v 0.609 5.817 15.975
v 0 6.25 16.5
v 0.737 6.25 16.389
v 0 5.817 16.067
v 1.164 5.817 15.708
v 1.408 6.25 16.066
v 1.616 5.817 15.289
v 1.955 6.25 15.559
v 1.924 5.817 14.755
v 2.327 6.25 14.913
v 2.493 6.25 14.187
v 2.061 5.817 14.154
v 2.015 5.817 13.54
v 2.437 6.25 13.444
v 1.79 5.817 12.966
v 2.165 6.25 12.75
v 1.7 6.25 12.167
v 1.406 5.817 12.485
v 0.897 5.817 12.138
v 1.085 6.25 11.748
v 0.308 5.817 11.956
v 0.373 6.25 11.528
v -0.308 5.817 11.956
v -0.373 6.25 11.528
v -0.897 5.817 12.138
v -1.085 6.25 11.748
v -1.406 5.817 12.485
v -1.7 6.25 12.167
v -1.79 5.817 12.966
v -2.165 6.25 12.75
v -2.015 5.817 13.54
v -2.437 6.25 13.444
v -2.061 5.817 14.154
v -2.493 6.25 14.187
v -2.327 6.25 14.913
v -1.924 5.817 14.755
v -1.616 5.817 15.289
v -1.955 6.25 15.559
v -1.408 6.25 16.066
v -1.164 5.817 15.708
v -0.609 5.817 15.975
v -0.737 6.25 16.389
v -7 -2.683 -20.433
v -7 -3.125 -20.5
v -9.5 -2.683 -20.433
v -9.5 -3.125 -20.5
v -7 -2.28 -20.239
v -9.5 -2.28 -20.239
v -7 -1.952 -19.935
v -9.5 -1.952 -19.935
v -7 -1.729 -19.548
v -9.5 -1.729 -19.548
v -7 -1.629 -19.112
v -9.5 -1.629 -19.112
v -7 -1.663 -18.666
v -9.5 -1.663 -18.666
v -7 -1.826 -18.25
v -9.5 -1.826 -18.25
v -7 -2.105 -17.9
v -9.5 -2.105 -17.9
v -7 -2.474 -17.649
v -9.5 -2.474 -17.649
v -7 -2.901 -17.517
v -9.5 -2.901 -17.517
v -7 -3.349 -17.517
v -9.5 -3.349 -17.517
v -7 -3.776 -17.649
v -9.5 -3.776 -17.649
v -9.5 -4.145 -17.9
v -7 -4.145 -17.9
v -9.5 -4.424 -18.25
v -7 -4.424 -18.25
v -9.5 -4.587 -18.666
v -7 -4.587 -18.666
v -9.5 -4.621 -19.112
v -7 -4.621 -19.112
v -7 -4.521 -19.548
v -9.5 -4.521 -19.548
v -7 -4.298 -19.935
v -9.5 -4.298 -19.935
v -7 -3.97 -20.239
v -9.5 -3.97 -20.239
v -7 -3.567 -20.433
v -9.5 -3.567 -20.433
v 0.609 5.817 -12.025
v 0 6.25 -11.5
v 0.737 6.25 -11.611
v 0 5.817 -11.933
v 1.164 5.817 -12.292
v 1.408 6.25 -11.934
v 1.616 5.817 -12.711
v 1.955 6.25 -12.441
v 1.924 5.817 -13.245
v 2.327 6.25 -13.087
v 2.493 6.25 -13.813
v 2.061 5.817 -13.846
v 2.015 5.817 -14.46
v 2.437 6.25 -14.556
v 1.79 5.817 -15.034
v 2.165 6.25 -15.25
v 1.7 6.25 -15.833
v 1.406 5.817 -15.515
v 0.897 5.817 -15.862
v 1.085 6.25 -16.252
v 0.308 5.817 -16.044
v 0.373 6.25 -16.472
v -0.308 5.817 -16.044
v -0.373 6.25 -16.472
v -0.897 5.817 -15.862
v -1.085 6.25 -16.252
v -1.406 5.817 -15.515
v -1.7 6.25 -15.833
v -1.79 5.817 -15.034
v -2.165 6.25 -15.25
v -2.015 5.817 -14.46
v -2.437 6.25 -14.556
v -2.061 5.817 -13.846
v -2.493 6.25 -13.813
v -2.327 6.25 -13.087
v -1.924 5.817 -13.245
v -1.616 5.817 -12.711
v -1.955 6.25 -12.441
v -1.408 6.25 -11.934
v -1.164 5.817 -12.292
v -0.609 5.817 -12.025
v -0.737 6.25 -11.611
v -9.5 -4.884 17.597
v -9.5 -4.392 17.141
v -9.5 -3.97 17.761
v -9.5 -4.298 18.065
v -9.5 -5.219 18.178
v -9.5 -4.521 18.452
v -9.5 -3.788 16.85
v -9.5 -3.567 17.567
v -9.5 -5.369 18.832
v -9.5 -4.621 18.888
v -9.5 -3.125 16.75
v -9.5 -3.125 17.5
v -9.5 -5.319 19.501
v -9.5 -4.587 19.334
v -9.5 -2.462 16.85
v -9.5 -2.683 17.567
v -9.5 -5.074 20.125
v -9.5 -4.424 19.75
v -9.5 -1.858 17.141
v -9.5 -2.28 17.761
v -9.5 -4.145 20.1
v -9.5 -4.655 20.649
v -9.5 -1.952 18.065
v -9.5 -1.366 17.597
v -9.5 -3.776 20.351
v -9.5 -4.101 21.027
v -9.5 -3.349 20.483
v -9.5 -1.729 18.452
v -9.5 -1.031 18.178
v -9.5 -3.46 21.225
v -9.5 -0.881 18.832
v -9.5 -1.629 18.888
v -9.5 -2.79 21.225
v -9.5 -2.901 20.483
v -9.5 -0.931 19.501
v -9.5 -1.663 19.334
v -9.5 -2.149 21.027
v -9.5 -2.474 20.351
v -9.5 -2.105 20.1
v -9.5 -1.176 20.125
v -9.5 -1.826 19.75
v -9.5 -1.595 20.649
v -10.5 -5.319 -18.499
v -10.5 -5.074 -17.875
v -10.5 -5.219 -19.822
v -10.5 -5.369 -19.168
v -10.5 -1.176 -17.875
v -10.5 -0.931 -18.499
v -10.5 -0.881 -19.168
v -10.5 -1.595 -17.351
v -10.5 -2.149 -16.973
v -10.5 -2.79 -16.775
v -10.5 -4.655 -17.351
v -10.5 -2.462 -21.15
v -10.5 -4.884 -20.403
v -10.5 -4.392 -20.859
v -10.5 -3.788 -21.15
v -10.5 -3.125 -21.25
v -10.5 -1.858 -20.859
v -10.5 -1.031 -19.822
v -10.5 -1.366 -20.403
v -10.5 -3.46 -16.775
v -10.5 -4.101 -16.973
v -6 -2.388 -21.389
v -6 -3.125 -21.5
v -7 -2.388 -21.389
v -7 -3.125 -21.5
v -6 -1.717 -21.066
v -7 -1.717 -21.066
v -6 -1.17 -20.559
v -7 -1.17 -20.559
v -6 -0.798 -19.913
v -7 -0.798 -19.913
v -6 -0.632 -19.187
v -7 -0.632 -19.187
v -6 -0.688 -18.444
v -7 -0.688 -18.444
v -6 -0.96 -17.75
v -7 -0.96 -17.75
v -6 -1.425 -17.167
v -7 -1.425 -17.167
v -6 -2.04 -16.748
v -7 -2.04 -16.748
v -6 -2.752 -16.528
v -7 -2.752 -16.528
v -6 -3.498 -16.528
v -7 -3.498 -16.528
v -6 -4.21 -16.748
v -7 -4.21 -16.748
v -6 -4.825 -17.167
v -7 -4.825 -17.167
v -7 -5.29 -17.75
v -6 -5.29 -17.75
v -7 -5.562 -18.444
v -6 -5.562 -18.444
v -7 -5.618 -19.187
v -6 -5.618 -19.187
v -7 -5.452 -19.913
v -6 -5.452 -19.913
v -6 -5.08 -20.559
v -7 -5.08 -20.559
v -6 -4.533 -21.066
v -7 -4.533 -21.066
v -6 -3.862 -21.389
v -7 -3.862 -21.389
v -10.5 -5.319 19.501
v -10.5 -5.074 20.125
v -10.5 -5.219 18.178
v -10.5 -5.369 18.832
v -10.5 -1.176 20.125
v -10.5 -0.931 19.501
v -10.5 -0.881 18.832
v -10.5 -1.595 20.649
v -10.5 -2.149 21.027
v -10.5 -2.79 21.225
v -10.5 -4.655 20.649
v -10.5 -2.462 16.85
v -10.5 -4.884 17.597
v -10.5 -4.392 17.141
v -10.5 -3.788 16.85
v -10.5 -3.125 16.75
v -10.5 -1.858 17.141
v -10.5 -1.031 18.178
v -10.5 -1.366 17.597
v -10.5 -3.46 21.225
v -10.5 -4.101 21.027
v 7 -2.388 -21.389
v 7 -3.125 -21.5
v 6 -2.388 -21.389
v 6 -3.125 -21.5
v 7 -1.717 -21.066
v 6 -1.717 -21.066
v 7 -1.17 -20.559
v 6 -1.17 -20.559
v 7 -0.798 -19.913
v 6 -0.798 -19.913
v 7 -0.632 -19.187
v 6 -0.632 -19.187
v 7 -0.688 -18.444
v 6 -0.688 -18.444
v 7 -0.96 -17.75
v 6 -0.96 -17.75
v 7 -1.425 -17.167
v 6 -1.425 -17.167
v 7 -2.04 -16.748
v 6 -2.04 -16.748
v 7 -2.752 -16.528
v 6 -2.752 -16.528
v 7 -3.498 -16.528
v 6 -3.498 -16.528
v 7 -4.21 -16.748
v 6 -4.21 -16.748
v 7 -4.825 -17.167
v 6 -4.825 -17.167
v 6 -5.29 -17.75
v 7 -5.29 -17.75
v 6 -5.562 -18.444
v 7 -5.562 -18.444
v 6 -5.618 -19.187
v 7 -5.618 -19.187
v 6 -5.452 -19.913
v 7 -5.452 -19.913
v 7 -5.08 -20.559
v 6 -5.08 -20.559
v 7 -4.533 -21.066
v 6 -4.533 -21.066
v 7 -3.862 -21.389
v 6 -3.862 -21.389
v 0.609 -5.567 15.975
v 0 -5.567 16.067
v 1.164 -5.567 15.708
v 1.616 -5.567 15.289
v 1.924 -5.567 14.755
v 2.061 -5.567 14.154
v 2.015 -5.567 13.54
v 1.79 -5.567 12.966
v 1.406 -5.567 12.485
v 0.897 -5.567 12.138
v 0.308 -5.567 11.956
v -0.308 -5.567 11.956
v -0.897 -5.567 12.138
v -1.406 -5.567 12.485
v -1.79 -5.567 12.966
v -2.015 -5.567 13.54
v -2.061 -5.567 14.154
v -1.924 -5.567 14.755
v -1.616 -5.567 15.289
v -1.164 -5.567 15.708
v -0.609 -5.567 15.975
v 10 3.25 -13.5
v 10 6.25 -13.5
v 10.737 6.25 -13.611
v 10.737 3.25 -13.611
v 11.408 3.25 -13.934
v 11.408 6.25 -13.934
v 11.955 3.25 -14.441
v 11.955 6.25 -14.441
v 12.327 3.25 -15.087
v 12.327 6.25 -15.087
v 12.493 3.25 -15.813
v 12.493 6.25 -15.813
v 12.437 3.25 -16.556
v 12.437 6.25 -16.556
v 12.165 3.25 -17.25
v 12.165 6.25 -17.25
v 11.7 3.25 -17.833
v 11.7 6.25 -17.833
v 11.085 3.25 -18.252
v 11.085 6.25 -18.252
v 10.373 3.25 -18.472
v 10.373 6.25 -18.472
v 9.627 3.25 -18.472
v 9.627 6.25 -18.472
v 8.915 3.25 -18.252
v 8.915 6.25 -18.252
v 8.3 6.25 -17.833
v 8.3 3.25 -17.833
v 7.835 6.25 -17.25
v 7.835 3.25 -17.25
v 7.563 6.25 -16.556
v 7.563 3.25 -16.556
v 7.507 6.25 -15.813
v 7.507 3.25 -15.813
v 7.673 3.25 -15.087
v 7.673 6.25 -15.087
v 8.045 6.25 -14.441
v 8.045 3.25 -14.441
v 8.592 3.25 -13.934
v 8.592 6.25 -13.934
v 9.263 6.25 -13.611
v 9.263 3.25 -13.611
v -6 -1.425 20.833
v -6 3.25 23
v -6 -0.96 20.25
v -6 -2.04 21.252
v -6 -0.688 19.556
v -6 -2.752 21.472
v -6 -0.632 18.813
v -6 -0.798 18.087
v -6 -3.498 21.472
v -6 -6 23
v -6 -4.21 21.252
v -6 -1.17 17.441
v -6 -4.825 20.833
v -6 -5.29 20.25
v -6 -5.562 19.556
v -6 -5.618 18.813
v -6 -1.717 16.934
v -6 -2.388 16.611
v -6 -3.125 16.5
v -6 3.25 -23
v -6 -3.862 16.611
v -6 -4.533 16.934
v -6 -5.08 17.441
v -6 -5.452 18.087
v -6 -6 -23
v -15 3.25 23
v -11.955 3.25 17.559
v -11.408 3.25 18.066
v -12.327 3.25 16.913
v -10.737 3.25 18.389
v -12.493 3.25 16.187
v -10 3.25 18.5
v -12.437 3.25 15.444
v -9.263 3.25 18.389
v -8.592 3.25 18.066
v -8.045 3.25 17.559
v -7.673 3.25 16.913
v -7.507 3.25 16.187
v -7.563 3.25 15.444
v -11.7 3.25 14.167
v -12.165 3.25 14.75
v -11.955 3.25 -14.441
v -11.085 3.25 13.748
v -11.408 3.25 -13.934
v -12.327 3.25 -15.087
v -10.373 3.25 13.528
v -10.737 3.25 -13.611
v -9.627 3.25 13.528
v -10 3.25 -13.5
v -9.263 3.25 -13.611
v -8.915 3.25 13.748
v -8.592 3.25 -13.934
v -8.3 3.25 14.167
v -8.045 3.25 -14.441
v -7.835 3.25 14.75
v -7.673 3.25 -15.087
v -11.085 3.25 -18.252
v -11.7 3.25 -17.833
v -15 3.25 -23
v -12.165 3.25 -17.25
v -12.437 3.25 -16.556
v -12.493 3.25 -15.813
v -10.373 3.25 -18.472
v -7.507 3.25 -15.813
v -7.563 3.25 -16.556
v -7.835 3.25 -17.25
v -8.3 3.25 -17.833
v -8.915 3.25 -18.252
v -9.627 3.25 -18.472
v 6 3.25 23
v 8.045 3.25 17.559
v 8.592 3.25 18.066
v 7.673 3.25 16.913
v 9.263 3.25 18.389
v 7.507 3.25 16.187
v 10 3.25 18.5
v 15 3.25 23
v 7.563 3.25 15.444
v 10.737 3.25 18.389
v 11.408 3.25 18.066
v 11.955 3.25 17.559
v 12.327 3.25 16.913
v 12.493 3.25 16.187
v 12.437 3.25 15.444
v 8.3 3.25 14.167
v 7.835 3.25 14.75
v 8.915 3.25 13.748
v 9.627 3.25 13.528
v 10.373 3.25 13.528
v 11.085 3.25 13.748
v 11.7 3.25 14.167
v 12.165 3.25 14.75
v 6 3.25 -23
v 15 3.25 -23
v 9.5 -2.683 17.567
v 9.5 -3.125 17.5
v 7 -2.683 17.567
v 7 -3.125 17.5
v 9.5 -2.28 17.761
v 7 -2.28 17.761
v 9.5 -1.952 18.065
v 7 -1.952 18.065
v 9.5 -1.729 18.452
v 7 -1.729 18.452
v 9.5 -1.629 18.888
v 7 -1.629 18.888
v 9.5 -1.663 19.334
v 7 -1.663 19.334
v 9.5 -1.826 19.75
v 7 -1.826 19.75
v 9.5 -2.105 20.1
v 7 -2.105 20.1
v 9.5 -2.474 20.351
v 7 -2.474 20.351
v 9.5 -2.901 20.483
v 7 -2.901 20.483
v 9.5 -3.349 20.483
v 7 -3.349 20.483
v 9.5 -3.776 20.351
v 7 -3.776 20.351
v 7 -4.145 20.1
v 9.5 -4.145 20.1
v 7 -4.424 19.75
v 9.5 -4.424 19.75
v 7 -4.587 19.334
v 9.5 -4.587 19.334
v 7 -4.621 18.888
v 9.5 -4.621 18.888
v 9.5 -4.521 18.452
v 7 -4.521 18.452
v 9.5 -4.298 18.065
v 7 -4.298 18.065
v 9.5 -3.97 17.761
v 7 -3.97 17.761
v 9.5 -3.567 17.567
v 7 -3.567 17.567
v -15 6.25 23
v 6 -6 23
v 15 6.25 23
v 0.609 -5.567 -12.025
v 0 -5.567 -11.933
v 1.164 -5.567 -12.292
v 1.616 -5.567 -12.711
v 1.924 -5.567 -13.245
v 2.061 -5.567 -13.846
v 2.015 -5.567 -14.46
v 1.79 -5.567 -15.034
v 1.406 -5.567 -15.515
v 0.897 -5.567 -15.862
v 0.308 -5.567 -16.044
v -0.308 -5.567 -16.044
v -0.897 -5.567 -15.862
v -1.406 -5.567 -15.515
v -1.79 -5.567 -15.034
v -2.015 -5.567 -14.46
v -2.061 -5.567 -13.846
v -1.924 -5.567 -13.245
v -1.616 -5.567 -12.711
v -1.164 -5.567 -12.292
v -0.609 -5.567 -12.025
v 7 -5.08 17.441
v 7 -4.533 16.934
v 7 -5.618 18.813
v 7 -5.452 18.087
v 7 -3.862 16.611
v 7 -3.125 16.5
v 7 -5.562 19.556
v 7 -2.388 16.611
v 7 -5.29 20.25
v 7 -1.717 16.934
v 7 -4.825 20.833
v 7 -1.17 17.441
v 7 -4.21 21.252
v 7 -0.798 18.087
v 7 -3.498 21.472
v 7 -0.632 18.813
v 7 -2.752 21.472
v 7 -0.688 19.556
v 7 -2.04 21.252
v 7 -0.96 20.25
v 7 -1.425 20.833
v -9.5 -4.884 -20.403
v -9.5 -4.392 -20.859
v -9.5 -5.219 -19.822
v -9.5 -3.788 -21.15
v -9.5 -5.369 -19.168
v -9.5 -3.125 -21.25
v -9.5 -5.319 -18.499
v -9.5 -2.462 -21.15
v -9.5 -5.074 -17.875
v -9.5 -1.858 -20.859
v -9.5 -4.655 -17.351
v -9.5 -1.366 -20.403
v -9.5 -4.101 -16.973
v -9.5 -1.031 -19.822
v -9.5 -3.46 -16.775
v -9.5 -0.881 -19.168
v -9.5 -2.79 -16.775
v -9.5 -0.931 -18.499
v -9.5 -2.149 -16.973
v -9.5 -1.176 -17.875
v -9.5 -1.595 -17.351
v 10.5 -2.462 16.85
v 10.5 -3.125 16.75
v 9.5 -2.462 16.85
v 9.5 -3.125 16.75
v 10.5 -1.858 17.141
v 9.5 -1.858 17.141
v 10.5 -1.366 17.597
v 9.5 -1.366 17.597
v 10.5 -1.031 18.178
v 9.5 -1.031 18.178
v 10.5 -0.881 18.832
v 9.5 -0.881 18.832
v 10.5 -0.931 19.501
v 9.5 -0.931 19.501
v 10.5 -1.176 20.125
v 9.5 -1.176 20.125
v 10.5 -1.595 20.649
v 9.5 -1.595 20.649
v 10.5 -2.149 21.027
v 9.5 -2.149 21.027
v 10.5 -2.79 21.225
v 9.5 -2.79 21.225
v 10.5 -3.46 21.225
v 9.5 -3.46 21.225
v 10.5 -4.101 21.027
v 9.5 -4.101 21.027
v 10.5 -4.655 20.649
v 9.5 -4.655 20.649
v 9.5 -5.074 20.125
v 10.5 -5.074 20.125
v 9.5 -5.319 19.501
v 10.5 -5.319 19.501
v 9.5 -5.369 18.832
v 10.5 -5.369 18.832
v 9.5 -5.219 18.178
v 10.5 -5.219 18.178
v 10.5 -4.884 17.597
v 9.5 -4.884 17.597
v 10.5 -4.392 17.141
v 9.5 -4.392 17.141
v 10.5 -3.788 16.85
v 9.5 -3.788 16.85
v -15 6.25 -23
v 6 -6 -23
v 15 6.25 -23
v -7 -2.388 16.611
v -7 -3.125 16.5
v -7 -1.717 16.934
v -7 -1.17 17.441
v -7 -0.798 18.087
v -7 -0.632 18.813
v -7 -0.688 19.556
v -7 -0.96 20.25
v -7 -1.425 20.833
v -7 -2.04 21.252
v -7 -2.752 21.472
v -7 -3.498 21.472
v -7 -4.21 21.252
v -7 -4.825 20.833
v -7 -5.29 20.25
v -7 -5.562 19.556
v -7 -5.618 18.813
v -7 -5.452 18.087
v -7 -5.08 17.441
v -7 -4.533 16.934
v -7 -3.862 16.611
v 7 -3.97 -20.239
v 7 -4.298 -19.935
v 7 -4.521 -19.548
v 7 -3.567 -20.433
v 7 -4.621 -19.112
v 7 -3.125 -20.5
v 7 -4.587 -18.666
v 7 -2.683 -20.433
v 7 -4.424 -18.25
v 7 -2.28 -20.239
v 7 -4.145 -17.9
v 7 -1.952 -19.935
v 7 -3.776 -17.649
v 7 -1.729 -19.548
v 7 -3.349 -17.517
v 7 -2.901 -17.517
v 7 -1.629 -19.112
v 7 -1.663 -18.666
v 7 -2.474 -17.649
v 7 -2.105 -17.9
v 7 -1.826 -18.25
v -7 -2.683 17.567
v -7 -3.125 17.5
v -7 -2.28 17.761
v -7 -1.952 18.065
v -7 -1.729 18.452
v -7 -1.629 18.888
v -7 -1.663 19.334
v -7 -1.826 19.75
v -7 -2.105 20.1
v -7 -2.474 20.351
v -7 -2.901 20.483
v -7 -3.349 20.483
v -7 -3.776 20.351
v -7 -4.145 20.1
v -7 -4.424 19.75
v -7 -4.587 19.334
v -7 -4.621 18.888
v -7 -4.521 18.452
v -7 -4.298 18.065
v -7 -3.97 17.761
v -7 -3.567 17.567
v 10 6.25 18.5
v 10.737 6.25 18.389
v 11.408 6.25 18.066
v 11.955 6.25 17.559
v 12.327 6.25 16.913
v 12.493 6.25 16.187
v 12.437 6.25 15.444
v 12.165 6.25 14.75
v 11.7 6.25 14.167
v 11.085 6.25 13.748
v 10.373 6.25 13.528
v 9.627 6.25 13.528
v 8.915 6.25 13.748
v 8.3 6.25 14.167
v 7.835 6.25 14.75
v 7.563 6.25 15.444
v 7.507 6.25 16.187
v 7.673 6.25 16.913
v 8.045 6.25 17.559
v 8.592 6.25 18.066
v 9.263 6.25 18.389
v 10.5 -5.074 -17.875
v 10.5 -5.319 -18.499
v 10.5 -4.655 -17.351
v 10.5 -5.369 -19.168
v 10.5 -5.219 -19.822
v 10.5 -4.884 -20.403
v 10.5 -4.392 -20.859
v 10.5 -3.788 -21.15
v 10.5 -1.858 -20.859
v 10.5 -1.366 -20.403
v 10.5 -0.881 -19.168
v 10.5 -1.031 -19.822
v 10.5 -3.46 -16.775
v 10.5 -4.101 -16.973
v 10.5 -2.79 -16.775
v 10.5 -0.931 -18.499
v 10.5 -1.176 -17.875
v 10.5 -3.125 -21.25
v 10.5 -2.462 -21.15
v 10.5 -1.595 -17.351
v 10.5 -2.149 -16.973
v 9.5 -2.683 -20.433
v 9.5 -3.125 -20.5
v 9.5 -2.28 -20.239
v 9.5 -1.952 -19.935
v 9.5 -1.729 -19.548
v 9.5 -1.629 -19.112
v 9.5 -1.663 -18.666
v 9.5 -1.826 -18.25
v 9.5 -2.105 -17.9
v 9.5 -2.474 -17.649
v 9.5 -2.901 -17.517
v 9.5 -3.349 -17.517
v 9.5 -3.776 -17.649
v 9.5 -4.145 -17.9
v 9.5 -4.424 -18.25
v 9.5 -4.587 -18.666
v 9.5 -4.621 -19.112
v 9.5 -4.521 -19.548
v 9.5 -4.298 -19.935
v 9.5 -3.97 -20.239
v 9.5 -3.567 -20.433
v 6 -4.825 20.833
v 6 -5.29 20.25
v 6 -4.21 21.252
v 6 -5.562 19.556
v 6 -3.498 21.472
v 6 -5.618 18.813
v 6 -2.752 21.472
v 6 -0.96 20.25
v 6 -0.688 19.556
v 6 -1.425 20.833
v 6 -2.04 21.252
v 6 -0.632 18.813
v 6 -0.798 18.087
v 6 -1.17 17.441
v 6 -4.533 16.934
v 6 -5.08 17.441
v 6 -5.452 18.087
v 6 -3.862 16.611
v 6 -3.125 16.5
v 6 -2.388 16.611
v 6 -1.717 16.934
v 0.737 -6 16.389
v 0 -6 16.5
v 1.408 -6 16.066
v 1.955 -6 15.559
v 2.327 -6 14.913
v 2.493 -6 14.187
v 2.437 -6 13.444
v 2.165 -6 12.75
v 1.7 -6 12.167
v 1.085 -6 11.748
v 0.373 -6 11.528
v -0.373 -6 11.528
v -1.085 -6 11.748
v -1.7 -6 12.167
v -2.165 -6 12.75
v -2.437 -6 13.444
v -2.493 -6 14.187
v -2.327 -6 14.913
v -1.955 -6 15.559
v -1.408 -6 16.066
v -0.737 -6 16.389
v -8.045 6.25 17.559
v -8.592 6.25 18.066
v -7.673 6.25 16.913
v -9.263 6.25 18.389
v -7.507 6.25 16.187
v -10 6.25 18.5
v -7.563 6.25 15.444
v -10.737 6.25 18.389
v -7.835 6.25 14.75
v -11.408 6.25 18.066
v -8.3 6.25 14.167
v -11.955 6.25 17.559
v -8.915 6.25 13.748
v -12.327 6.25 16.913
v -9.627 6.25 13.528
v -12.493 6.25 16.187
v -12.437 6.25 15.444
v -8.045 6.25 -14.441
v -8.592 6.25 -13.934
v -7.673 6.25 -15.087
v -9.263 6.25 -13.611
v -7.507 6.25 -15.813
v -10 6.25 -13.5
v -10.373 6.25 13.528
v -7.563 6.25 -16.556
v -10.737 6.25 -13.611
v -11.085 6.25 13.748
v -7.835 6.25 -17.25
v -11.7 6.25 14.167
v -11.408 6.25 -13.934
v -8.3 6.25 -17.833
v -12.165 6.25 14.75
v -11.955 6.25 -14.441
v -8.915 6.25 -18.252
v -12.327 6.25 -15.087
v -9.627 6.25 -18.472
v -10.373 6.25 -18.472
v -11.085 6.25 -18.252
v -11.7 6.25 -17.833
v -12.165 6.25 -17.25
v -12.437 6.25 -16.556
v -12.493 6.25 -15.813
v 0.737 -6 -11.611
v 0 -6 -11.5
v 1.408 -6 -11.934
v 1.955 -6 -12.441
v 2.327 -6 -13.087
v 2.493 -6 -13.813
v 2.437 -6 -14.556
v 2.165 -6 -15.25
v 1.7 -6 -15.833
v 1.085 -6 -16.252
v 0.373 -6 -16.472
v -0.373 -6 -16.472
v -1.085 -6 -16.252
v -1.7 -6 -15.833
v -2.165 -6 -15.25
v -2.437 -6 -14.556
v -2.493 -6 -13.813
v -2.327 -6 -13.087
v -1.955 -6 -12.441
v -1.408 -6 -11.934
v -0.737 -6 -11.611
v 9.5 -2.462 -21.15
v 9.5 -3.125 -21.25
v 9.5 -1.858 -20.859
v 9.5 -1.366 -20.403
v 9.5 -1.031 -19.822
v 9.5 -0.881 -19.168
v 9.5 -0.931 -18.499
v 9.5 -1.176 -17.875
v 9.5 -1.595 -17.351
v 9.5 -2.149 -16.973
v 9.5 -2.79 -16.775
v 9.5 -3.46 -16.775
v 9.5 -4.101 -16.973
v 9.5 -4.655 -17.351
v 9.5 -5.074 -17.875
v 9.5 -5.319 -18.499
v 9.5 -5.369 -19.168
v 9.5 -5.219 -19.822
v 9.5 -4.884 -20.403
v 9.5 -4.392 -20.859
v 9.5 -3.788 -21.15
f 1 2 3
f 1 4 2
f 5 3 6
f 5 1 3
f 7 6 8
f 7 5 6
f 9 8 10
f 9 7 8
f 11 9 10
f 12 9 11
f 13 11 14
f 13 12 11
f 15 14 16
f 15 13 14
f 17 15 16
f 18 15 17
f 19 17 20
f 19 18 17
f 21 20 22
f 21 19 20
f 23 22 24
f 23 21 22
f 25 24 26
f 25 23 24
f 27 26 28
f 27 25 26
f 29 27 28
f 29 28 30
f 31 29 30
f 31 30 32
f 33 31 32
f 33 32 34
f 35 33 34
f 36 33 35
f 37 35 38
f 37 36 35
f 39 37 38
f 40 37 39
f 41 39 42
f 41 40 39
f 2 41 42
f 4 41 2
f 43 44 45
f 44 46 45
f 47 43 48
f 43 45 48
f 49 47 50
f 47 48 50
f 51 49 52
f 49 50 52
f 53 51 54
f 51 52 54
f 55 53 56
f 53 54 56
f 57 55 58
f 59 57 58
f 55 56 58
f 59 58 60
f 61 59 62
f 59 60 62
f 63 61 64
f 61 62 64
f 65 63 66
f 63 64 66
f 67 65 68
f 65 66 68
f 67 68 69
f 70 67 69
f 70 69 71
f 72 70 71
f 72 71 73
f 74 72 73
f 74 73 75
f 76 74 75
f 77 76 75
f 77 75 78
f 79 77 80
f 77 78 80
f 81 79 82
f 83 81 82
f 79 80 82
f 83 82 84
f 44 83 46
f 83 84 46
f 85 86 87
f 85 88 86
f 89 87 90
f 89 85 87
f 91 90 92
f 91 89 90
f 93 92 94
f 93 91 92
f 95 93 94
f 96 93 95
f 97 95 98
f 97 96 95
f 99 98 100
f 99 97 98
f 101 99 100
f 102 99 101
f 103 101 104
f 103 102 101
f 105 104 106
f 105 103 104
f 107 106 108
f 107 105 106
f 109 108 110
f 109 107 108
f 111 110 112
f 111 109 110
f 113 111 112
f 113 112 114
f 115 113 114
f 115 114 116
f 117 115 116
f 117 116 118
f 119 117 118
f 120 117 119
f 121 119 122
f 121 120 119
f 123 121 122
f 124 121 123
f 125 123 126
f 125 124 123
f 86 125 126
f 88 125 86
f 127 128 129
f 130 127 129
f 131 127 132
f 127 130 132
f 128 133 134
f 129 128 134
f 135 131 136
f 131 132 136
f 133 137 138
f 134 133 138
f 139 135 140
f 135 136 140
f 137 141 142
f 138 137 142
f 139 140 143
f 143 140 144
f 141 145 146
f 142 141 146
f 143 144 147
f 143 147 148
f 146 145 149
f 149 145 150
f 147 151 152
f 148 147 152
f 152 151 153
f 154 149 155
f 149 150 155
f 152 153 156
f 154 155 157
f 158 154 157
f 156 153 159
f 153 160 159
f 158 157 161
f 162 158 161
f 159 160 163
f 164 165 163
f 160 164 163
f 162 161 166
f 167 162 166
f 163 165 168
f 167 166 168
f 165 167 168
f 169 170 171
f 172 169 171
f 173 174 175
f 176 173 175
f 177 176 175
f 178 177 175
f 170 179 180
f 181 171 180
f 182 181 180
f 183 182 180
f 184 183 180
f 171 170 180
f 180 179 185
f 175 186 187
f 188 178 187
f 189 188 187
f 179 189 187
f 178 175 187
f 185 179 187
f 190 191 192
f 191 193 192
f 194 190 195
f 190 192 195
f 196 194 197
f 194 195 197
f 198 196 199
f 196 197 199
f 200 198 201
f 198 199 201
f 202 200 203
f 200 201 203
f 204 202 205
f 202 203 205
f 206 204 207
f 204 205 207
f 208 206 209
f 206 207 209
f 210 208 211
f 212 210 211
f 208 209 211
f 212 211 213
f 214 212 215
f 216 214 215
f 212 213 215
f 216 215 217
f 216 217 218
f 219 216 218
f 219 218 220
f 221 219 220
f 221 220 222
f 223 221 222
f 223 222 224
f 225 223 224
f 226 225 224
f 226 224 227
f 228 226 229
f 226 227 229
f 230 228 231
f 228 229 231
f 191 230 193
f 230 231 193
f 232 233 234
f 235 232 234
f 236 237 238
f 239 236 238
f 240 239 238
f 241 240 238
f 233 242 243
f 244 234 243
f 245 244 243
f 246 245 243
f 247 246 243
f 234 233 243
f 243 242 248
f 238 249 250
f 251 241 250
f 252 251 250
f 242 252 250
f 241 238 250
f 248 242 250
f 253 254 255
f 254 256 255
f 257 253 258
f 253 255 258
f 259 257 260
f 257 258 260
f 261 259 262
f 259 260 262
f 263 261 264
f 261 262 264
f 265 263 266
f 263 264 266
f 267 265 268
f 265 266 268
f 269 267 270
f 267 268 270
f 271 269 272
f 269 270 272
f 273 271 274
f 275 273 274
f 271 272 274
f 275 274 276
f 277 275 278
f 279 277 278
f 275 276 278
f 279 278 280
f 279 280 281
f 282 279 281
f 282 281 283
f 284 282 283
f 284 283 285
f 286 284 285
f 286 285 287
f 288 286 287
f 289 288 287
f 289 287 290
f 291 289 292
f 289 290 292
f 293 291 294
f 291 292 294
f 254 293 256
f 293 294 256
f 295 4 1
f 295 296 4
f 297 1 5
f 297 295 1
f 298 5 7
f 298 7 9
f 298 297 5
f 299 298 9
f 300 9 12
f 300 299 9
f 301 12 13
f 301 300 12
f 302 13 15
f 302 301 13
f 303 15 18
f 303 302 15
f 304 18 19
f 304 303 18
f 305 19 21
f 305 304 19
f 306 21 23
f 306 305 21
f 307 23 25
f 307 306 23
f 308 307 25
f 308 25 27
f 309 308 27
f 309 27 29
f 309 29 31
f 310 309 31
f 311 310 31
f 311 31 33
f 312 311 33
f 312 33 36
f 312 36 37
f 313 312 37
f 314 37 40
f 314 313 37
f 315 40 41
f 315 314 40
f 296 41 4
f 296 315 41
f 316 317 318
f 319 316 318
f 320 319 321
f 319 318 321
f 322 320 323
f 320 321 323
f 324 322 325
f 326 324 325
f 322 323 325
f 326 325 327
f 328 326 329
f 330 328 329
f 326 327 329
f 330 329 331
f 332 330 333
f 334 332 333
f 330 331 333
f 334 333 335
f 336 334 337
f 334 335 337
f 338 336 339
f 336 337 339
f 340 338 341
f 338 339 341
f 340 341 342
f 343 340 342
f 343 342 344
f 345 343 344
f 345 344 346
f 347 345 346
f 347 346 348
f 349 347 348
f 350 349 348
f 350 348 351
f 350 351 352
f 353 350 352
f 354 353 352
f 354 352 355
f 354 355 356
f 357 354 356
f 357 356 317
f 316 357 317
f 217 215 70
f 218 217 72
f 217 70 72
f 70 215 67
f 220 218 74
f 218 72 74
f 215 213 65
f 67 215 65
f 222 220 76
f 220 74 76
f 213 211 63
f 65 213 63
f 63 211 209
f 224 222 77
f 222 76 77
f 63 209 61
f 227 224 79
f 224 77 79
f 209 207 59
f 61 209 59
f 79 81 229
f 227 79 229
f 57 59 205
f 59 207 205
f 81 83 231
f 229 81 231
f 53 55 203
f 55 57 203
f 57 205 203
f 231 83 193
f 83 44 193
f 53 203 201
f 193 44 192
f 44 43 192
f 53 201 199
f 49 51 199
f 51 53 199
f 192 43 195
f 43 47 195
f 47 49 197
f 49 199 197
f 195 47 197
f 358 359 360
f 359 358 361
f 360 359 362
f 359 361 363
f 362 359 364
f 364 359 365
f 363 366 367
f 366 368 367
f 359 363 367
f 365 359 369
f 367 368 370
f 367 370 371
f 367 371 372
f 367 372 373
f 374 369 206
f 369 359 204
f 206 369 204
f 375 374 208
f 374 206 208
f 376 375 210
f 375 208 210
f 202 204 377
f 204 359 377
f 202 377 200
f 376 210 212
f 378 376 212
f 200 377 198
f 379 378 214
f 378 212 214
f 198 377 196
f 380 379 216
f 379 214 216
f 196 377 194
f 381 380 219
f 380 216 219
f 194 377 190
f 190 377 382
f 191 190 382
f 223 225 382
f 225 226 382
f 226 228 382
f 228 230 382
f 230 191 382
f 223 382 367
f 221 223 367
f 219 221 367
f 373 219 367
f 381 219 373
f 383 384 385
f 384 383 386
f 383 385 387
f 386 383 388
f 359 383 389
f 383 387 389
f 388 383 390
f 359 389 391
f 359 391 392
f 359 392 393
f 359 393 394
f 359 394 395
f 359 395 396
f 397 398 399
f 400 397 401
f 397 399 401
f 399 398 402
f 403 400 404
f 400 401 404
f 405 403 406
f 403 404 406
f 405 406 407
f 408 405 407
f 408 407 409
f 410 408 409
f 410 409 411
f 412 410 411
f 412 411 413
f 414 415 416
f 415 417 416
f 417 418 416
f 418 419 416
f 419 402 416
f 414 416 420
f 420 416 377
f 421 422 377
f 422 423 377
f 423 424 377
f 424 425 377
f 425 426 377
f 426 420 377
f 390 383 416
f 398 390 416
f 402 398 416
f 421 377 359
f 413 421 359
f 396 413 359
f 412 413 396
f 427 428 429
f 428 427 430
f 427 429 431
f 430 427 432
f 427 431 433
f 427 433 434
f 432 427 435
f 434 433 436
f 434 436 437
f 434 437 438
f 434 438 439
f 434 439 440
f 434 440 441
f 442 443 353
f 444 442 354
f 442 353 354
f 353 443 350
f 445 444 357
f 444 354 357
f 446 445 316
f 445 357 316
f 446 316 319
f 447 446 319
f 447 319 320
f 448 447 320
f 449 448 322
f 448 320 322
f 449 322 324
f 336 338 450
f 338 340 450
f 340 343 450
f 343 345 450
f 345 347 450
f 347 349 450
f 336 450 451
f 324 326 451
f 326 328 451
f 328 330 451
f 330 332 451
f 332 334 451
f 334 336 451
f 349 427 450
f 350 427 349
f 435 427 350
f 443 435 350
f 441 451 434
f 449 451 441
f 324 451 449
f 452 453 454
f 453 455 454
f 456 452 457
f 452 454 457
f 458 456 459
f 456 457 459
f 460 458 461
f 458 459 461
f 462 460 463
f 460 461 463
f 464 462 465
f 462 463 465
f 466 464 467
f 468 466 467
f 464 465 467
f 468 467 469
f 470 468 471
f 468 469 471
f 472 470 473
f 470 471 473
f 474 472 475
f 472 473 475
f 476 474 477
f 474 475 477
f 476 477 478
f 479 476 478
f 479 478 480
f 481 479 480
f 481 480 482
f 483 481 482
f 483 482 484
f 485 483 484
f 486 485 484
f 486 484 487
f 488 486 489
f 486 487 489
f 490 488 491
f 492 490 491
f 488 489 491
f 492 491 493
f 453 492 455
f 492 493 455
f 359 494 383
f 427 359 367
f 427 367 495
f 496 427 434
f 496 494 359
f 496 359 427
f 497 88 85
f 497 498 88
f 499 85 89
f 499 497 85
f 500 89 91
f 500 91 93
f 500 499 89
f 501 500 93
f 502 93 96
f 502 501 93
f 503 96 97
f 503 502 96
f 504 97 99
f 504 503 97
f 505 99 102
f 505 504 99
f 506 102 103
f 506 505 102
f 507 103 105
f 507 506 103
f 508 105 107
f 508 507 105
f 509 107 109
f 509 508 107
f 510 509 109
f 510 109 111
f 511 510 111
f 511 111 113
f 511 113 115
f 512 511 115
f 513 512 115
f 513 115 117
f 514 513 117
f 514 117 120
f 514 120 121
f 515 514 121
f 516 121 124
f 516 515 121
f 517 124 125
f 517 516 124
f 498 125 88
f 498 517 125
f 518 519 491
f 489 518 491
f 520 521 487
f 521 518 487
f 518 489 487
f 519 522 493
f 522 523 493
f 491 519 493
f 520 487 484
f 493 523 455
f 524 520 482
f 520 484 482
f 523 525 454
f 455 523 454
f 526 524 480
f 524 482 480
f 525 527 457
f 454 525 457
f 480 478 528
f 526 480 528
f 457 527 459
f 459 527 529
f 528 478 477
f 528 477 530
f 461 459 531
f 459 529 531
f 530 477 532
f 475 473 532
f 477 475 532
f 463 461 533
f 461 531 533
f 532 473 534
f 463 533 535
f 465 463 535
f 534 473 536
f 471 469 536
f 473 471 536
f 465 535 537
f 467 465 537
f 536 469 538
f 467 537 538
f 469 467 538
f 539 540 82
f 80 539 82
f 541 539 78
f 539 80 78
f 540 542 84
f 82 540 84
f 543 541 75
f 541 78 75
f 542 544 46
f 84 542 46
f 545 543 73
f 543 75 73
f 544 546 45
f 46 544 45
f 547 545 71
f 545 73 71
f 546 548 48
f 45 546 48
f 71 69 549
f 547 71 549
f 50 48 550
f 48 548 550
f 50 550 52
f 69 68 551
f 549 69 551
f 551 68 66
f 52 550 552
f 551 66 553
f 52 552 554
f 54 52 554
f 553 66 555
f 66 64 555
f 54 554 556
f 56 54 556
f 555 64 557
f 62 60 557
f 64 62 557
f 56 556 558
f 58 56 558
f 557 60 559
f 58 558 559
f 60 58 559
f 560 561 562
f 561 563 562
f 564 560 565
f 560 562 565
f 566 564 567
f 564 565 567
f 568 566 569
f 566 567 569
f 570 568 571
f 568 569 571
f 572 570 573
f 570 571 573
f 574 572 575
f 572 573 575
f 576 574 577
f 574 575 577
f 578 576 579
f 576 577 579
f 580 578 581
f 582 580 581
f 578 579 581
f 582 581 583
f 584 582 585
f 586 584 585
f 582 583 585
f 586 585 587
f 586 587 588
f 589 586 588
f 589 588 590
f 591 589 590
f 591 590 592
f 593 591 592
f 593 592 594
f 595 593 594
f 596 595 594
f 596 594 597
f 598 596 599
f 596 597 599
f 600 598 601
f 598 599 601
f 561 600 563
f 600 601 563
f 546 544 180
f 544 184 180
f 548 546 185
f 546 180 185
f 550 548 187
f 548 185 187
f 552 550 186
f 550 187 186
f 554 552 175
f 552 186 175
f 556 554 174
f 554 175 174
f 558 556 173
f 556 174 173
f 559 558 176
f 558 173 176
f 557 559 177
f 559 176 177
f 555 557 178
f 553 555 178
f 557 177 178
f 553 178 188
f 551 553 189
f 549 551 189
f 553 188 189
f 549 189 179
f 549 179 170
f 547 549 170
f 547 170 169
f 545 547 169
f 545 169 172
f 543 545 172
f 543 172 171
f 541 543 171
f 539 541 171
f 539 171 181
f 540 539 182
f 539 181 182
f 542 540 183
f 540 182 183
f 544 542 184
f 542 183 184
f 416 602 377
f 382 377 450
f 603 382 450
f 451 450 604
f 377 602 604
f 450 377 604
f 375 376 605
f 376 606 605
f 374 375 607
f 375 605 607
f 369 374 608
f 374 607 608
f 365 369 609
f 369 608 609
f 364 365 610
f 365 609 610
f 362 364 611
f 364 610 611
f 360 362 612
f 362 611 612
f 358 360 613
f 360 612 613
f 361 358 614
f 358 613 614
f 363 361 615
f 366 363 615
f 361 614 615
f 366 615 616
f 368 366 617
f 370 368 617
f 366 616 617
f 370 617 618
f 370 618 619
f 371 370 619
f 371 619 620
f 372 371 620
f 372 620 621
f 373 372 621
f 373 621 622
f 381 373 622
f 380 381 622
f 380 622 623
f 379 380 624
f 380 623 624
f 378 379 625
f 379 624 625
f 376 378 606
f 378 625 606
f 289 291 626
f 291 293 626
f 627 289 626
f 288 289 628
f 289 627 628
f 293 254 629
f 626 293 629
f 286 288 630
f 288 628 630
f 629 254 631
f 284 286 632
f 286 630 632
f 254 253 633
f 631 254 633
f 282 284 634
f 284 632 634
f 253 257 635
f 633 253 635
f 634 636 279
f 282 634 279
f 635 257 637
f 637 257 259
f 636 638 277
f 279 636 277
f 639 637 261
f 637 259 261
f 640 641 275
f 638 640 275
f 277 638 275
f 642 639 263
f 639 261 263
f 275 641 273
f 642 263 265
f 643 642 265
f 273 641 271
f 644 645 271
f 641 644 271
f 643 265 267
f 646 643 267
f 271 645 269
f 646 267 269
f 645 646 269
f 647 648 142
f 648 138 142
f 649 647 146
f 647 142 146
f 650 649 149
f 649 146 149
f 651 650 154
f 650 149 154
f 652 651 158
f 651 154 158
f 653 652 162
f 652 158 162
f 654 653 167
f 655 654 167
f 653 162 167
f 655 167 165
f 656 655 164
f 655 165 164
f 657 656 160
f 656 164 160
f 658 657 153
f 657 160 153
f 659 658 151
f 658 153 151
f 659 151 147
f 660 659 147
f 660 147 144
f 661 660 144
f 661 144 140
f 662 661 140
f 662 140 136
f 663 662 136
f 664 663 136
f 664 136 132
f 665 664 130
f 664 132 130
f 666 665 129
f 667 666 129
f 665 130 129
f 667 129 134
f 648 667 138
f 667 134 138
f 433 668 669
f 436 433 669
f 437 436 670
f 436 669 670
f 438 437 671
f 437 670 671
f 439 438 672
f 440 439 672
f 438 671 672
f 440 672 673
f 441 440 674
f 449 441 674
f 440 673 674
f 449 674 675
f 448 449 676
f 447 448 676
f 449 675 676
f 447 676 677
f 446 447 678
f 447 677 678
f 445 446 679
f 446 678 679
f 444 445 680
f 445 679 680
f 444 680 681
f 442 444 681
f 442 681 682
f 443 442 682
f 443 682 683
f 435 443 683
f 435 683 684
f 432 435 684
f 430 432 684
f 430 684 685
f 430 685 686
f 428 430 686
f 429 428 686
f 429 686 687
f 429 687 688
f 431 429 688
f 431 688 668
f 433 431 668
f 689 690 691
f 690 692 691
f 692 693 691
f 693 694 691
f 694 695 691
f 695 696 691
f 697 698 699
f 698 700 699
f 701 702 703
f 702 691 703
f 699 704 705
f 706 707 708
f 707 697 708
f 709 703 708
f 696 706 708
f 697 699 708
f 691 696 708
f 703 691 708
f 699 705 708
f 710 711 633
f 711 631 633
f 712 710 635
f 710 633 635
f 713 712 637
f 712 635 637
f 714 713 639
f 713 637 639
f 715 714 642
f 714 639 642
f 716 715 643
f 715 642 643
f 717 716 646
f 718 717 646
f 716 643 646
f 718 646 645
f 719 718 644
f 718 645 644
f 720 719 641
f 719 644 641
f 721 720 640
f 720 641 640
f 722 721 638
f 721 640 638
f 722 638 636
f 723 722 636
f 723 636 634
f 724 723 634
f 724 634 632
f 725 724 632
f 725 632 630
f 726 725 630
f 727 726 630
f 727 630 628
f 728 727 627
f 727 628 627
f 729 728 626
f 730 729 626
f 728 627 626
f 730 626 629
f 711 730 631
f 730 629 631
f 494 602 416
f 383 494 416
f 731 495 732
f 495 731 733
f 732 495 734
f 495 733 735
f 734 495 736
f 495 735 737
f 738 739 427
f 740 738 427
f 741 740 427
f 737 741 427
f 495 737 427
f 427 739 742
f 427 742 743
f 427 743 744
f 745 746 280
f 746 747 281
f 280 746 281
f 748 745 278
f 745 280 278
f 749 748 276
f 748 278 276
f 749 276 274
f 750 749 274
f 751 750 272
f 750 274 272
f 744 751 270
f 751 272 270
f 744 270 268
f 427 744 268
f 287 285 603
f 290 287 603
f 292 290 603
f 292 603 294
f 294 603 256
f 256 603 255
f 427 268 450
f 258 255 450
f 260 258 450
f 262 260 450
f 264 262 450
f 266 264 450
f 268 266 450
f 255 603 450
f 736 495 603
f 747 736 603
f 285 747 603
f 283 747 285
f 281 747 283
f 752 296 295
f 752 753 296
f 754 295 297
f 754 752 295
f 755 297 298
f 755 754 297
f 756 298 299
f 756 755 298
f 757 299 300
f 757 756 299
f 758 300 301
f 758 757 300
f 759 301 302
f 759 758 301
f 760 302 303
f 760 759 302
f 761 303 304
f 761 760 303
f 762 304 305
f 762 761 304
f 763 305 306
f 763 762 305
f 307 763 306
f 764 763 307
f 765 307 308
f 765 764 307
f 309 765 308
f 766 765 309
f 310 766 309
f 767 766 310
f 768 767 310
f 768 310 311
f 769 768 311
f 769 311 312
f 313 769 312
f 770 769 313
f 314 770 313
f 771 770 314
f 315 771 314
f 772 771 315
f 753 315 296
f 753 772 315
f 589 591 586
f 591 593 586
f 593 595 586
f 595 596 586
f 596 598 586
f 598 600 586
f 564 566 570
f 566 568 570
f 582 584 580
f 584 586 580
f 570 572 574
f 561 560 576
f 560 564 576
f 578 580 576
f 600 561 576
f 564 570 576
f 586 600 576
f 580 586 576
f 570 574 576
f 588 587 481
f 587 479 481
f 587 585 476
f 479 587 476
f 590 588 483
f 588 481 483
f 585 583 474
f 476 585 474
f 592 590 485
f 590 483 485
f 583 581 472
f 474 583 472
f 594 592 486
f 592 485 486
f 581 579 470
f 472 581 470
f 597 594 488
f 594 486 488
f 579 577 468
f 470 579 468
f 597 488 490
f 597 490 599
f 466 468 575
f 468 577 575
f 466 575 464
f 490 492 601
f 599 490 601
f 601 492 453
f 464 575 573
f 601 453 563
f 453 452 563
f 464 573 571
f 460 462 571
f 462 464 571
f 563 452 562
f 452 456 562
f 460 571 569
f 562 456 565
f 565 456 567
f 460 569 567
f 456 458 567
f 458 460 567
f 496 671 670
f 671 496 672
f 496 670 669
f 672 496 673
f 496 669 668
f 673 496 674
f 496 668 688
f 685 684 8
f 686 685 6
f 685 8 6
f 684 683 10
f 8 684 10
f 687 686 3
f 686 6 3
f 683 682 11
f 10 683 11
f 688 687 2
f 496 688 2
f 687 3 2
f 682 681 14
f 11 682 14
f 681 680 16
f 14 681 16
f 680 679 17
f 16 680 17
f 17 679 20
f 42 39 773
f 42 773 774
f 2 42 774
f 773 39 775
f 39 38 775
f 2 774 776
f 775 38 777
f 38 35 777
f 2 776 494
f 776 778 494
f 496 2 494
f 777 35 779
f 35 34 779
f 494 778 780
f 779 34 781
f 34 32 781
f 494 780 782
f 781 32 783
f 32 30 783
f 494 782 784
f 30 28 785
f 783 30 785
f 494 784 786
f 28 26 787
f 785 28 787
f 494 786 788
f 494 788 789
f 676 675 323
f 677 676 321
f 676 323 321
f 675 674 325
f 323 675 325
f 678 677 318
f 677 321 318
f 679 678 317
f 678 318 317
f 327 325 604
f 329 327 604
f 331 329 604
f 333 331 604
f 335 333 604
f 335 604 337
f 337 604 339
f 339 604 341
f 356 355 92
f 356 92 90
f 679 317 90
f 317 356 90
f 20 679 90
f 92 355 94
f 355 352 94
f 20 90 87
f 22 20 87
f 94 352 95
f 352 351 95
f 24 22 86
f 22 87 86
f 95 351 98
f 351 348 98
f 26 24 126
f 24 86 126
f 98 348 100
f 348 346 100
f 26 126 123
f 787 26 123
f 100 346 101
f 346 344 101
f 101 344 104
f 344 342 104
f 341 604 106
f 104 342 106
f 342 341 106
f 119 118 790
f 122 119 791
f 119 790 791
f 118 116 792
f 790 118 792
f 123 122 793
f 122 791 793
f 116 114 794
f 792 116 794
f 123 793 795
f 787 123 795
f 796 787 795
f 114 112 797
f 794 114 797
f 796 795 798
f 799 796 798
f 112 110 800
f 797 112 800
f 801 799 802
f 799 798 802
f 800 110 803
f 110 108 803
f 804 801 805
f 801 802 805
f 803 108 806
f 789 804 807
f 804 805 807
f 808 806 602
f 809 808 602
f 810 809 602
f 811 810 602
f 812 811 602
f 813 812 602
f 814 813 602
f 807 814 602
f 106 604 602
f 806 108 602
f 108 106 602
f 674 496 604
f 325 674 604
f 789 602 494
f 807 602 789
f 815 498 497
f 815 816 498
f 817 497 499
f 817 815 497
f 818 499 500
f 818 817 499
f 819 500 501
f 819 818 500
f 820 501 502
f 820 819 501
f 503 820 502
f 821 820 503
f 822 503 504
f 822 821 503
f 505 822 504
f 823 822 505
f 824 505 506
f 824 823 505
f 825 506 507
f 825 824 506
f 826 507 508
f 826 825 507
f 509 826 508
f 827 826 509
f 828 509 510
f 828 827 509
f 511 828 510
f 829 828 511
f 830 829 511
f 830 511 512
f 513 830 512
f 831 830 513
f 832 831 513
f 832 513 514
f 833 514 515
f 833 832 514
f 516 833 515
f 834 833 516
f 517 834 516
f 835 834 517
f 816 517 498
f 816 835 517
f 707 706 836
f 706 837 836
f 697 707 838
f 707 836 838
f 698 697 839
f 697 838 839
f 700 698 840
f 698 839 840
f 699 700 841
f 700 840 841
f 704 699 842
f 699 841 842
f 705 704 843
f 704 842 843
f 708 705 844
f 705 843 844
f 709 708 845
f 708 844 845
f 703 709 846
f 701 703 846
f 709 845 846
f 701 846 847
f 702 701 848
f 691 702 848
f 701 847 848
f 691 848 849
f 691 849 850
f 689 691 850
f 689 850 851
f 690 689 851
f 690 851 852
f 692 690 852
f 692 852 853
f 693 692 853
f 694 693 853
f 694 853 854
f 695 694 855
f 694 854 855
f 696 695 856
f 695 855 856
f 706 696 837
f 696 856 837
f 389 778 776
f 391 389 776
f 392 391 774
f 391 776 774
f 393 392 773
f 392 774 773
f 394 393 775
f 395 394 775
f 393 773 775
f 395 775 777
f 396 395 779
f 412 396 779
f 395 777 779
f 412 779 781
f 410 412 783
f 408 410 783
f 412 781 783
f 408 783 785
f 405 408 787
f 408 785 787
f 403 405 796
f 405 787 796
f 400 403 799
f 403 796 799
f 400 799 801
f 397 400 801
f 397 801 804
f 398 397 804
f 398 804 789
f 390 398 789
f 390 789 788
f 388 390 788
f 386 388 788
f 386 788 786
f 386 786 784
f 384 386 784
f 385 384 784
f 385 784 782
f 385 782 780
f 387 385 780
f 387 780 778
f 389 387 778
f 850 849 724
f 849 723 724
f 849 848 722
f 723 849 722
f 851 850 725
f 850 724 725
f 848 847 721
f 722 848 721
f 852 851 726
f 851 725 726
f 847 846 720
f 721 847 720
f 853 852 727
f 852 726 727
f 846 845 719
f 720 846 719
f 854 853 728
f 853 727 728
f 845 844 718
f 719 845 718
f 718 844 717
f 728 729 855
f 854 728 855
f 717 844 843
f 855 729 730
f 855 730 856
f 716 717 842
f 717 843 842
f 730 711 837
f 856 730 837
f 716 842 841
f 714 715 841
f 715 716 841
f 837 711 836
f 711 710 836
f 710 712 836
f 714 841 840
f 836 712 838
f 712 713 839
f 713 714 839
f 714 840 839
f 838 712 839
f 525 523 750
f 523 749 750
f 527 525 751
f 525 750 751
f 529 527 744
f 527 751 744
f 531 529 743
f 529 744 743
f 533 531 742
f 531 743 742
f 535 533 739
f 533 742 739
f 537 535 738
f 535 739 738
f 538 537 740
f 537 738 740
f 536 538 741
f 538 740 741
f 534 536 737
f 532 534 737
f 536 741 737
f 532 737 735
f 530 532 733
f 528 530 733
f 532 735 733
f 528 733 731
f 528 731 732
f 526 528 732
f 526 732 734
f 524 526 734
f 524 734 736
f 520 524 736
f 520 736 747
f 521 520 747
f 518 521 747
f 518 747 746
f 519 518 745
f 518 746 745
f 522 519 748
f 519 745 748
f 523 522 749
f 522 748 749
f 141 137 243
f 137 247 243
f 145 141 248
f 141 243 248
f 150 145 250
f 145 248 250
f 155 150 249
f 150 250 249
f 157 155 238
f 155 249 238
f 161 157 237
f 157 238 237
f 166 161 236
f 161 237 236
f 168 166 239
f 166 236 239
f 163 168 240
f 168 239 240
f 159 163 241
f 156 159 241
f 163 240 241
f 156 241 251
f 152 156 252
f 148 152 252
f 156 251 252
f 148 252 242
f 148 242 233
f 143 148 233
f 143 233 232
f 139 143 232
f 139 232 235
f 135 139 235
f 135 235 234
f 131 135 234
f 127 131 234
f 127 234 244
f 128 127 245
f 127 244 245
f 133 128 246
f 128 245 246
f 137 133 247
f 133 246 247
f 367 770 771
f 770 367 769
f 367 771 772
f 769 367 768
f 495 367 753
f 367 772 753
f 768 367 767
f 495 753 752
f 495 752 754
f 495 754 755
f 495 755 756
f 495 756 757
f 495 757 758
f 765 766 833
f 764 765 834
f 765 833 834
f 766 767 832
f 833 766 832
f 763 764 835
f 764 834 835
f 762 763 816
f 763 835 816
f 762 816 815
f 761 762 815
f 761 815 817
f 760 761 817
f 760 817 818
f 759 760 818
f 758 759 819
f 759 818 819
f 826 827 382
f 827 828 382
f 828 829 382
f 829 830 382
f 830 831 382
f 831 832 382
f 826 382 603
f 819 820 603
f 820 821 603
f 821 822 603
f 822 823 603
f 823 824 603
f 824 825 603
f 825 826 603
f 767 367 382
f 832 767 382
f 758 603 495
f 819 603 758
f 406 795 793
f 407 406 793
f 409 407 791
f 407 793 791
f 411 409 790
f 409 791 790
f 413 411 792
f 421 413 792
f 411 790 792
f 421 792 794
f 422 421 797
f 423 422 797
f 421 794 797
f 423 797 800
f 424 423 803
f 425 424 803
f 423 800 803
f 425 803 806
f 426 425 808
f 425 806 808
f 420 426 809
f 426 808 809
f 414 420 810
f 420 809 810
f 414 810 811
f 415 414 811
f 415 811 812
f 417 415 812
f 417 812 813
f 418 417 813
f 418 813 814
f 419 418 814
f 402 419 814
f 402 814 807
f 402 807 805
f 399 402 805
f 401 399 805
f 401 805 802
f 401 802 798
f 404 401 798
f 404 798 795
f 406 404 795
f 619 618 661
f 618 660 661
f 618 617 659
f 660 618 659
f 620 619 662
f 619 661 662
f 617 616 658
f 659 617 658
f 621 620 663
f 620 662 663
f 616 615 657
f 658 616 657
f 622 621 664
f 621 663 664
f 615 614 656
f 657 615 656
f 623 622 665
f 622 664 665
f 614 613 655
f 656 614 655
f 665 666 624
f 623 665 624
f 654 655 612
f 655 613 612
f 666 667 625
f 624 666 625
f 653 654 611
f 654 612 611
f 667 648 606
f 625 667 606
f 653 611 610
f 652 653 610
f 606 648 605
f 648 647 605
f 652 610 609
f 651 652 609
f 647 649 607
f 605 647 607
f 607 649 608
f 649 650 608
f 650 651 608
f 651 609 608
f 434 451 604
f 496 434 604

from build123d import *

# Parameters (mm, degrees)
BOSS_EXTRUDE1_DEPTH      = 23
BOSS_EXTRUDE1_DEPTH_BACK = 23
CUT_EXTRUDE1_REACH       = 32.068
SKETCH6_R                = 2.5


with BuildPart() as part:
    # Sketch1 → Boss-Extrude1 (new, two sides: drawn at the far end of the back side and taken through both)
    with BuildSketch(Plane.XY.offset(-BOSS_EXTRUDE1_DEPTH_BACK)):
        Polygon((-15, 6.25), (-15, 3.25), (-6, 3.25), (-6, -6), (6, -6), (6, 3.25), (15, 3.25), (15, 6.25), align=None)
    extrude(amount=BOSS_EXTRUDE1_DEPTH + BOSS_EXTRUDE1_DEPTH_BACK)

    # Sketch2 → Revolve1 (revolve)
    with BuildSketch(Plane.XY.offset(19)):
        Polygon((10.5, -3.125), (10.5, -5.375), (9.5, -5.375), (9.5, -4.625), (7, -4.625), (7, -5.625), (6, -5.625), (6, -4.625), (-6, -4.625), (-6, -5.625), (-7, -5.625), (-7, -4.625), (-9.5, -4.625), (-9.5, -5.375), (-10.5, -5.375), (-10.5, -3.125), align=None)
    revolve(axis=Axis((-10.5, -3.125, 19), (1, 0, 0)))

    # Sketch3 → Revolve2 (revolve)
    with BuildSketch(Plane.XY.offset(-19)):
        Polygon((10.5, -3.125), (10.5, -5.375), (9.5, -5.375), (9.5, -4.625), (7, -4.625), (7, -5.625), (6, -5.625), (6, -4.625), (-6, -4.625), (-6, -5.625), (-7, -5.625), (-7, -4.625), (-9.5, -4.625), (-9.5, -5.375), (-10.5, -5.375), (-10.5, -3.125), align=None)
    revolve(axis=Axis((-10.5, -3.125, -19), (1, 0, 0)))

    # Sketch4 → Cut-Revolve1 (revolve, cut)
    with BuildSketch(Plane(origin=(0, 0, 0), x_dir=(0, 0, -1), z_dir=(1, 0, 0))):
        Polygon((-14, 6.25), (-11.5, 6.25), (-11.933, 5.817), (-11.933, -5.567), (-11.5, -6), (-14, -6), align=None)
    revolve(axis=Axis((0, -6, 14), (0, 1, 0)), mode=Mode.SUBTRACT)

    # Sketch5 → Cut-Revolve2 (revolve, cut)
    with BuildSketch(Plane(origin=(0, 0, 0), x_dir=(0, 0, -1), z_dir=(1, 0, 0))):
        Polygon((14, 6.25), (16.5, 6.25), (16.067, 5.817), (16.067, -5.567), (16.5, -6), (14, -6), align=None)
    revolve(axis=Axis((0, -6, -14), (0, 1, 0)), mode=Mode.SUBTRACT)

    # Sketch6 → Cut-Extrude1 (cut, up to next)
    with BuildSketch(Plane(origin=(0, 6.25, 0), x_dir=(1, 0, 0), z_dir=(0, 1, 0)), mode=Mode.PRIVATE) as cut_extrude1_sk1:
        with Locations((-10, 16)):
            Circle(SKETCH6_R)
    cut_extrude1_tool1 = extrude(cut_extrude1_sk1.sketch, amount=-CUT_EXTRUDE1_REACH, mode=Mode.PRIVATE) & part.part
    # Sketch6 → Cut-Extrude1 (cut, up to next)
    with BuildSketch(Plane(origin=(0, 6.25, 0), x_dir=(1, 0, 0), z_dir=(0, 1, 0)), mode=Mode.PRIVATE) as cut_extrude1_sk2:
        with Locations((10, 16)):
            Circle(SKETCH6_R)
    cut_extrude1_tool2 = extrude(cut_extrude1_sk2.sketch, amount=-CUT_EXTRUDE1_REACH, mode=Mode.PRIVATE) & part.part
    # Sketch6 → Cut-Extrude1 (cut, up to next)
    with BuildSketch(Plane(origin=(0, 6.25, 0), x_dir=(1, 0, 0), z_dir=(0, 1, 0)), mode=Mode.PRIVATE) as cut_extrude1_sk3:
        with Locations((-10, -16)):
            Circle(SKETCH6_R)
    cut_extrude1_tool3 = extrude(cut_extrude1_sk3.sketch, amount=-CUT_EXTRUDE1_REACH, mode=Mode.PRIVATE) & part.part
    # Sketch6 → Cut-Extrude1 (cut, up to next)
    with BuildSketch(Plane(origin=(0, 6.25, 0), x_dir=(1, 0, 0), z_dir=(0, 1, 0)), mode=Mode.PRIVATE) as cut_extrude1_sk4:
        with Locations((10, -16)):
            Circle(SKETCH6_R)
    cut_extrude1_tool4 = extrude(cut_extrude1_sk4.sketch, amount=-CUT_EXTRUDE1_REACH, mode=Mode.PRIVATE) & part.part
    add(cut_extrude1_tool1.solids().sort_by_distance((-10, 6.25, -16))[0], mode=Mode.SUBTRACT)
    add(cut_extrude1_tool2.solids().sort_by_distance((10, 6.25, -16))[0], mode=Mode.SUBTRACT)
    add(cut_extrude1_tool3.solids().sort_by_distance((-10, 6.25, 16))[0], mode=Mode.SUBTRACT)
    add(cut_extrude1_tool4.solids().sort_by_distance((10, 6.25, 16))[0], mode=Mode.SUBTRACT)


solid = part.part
